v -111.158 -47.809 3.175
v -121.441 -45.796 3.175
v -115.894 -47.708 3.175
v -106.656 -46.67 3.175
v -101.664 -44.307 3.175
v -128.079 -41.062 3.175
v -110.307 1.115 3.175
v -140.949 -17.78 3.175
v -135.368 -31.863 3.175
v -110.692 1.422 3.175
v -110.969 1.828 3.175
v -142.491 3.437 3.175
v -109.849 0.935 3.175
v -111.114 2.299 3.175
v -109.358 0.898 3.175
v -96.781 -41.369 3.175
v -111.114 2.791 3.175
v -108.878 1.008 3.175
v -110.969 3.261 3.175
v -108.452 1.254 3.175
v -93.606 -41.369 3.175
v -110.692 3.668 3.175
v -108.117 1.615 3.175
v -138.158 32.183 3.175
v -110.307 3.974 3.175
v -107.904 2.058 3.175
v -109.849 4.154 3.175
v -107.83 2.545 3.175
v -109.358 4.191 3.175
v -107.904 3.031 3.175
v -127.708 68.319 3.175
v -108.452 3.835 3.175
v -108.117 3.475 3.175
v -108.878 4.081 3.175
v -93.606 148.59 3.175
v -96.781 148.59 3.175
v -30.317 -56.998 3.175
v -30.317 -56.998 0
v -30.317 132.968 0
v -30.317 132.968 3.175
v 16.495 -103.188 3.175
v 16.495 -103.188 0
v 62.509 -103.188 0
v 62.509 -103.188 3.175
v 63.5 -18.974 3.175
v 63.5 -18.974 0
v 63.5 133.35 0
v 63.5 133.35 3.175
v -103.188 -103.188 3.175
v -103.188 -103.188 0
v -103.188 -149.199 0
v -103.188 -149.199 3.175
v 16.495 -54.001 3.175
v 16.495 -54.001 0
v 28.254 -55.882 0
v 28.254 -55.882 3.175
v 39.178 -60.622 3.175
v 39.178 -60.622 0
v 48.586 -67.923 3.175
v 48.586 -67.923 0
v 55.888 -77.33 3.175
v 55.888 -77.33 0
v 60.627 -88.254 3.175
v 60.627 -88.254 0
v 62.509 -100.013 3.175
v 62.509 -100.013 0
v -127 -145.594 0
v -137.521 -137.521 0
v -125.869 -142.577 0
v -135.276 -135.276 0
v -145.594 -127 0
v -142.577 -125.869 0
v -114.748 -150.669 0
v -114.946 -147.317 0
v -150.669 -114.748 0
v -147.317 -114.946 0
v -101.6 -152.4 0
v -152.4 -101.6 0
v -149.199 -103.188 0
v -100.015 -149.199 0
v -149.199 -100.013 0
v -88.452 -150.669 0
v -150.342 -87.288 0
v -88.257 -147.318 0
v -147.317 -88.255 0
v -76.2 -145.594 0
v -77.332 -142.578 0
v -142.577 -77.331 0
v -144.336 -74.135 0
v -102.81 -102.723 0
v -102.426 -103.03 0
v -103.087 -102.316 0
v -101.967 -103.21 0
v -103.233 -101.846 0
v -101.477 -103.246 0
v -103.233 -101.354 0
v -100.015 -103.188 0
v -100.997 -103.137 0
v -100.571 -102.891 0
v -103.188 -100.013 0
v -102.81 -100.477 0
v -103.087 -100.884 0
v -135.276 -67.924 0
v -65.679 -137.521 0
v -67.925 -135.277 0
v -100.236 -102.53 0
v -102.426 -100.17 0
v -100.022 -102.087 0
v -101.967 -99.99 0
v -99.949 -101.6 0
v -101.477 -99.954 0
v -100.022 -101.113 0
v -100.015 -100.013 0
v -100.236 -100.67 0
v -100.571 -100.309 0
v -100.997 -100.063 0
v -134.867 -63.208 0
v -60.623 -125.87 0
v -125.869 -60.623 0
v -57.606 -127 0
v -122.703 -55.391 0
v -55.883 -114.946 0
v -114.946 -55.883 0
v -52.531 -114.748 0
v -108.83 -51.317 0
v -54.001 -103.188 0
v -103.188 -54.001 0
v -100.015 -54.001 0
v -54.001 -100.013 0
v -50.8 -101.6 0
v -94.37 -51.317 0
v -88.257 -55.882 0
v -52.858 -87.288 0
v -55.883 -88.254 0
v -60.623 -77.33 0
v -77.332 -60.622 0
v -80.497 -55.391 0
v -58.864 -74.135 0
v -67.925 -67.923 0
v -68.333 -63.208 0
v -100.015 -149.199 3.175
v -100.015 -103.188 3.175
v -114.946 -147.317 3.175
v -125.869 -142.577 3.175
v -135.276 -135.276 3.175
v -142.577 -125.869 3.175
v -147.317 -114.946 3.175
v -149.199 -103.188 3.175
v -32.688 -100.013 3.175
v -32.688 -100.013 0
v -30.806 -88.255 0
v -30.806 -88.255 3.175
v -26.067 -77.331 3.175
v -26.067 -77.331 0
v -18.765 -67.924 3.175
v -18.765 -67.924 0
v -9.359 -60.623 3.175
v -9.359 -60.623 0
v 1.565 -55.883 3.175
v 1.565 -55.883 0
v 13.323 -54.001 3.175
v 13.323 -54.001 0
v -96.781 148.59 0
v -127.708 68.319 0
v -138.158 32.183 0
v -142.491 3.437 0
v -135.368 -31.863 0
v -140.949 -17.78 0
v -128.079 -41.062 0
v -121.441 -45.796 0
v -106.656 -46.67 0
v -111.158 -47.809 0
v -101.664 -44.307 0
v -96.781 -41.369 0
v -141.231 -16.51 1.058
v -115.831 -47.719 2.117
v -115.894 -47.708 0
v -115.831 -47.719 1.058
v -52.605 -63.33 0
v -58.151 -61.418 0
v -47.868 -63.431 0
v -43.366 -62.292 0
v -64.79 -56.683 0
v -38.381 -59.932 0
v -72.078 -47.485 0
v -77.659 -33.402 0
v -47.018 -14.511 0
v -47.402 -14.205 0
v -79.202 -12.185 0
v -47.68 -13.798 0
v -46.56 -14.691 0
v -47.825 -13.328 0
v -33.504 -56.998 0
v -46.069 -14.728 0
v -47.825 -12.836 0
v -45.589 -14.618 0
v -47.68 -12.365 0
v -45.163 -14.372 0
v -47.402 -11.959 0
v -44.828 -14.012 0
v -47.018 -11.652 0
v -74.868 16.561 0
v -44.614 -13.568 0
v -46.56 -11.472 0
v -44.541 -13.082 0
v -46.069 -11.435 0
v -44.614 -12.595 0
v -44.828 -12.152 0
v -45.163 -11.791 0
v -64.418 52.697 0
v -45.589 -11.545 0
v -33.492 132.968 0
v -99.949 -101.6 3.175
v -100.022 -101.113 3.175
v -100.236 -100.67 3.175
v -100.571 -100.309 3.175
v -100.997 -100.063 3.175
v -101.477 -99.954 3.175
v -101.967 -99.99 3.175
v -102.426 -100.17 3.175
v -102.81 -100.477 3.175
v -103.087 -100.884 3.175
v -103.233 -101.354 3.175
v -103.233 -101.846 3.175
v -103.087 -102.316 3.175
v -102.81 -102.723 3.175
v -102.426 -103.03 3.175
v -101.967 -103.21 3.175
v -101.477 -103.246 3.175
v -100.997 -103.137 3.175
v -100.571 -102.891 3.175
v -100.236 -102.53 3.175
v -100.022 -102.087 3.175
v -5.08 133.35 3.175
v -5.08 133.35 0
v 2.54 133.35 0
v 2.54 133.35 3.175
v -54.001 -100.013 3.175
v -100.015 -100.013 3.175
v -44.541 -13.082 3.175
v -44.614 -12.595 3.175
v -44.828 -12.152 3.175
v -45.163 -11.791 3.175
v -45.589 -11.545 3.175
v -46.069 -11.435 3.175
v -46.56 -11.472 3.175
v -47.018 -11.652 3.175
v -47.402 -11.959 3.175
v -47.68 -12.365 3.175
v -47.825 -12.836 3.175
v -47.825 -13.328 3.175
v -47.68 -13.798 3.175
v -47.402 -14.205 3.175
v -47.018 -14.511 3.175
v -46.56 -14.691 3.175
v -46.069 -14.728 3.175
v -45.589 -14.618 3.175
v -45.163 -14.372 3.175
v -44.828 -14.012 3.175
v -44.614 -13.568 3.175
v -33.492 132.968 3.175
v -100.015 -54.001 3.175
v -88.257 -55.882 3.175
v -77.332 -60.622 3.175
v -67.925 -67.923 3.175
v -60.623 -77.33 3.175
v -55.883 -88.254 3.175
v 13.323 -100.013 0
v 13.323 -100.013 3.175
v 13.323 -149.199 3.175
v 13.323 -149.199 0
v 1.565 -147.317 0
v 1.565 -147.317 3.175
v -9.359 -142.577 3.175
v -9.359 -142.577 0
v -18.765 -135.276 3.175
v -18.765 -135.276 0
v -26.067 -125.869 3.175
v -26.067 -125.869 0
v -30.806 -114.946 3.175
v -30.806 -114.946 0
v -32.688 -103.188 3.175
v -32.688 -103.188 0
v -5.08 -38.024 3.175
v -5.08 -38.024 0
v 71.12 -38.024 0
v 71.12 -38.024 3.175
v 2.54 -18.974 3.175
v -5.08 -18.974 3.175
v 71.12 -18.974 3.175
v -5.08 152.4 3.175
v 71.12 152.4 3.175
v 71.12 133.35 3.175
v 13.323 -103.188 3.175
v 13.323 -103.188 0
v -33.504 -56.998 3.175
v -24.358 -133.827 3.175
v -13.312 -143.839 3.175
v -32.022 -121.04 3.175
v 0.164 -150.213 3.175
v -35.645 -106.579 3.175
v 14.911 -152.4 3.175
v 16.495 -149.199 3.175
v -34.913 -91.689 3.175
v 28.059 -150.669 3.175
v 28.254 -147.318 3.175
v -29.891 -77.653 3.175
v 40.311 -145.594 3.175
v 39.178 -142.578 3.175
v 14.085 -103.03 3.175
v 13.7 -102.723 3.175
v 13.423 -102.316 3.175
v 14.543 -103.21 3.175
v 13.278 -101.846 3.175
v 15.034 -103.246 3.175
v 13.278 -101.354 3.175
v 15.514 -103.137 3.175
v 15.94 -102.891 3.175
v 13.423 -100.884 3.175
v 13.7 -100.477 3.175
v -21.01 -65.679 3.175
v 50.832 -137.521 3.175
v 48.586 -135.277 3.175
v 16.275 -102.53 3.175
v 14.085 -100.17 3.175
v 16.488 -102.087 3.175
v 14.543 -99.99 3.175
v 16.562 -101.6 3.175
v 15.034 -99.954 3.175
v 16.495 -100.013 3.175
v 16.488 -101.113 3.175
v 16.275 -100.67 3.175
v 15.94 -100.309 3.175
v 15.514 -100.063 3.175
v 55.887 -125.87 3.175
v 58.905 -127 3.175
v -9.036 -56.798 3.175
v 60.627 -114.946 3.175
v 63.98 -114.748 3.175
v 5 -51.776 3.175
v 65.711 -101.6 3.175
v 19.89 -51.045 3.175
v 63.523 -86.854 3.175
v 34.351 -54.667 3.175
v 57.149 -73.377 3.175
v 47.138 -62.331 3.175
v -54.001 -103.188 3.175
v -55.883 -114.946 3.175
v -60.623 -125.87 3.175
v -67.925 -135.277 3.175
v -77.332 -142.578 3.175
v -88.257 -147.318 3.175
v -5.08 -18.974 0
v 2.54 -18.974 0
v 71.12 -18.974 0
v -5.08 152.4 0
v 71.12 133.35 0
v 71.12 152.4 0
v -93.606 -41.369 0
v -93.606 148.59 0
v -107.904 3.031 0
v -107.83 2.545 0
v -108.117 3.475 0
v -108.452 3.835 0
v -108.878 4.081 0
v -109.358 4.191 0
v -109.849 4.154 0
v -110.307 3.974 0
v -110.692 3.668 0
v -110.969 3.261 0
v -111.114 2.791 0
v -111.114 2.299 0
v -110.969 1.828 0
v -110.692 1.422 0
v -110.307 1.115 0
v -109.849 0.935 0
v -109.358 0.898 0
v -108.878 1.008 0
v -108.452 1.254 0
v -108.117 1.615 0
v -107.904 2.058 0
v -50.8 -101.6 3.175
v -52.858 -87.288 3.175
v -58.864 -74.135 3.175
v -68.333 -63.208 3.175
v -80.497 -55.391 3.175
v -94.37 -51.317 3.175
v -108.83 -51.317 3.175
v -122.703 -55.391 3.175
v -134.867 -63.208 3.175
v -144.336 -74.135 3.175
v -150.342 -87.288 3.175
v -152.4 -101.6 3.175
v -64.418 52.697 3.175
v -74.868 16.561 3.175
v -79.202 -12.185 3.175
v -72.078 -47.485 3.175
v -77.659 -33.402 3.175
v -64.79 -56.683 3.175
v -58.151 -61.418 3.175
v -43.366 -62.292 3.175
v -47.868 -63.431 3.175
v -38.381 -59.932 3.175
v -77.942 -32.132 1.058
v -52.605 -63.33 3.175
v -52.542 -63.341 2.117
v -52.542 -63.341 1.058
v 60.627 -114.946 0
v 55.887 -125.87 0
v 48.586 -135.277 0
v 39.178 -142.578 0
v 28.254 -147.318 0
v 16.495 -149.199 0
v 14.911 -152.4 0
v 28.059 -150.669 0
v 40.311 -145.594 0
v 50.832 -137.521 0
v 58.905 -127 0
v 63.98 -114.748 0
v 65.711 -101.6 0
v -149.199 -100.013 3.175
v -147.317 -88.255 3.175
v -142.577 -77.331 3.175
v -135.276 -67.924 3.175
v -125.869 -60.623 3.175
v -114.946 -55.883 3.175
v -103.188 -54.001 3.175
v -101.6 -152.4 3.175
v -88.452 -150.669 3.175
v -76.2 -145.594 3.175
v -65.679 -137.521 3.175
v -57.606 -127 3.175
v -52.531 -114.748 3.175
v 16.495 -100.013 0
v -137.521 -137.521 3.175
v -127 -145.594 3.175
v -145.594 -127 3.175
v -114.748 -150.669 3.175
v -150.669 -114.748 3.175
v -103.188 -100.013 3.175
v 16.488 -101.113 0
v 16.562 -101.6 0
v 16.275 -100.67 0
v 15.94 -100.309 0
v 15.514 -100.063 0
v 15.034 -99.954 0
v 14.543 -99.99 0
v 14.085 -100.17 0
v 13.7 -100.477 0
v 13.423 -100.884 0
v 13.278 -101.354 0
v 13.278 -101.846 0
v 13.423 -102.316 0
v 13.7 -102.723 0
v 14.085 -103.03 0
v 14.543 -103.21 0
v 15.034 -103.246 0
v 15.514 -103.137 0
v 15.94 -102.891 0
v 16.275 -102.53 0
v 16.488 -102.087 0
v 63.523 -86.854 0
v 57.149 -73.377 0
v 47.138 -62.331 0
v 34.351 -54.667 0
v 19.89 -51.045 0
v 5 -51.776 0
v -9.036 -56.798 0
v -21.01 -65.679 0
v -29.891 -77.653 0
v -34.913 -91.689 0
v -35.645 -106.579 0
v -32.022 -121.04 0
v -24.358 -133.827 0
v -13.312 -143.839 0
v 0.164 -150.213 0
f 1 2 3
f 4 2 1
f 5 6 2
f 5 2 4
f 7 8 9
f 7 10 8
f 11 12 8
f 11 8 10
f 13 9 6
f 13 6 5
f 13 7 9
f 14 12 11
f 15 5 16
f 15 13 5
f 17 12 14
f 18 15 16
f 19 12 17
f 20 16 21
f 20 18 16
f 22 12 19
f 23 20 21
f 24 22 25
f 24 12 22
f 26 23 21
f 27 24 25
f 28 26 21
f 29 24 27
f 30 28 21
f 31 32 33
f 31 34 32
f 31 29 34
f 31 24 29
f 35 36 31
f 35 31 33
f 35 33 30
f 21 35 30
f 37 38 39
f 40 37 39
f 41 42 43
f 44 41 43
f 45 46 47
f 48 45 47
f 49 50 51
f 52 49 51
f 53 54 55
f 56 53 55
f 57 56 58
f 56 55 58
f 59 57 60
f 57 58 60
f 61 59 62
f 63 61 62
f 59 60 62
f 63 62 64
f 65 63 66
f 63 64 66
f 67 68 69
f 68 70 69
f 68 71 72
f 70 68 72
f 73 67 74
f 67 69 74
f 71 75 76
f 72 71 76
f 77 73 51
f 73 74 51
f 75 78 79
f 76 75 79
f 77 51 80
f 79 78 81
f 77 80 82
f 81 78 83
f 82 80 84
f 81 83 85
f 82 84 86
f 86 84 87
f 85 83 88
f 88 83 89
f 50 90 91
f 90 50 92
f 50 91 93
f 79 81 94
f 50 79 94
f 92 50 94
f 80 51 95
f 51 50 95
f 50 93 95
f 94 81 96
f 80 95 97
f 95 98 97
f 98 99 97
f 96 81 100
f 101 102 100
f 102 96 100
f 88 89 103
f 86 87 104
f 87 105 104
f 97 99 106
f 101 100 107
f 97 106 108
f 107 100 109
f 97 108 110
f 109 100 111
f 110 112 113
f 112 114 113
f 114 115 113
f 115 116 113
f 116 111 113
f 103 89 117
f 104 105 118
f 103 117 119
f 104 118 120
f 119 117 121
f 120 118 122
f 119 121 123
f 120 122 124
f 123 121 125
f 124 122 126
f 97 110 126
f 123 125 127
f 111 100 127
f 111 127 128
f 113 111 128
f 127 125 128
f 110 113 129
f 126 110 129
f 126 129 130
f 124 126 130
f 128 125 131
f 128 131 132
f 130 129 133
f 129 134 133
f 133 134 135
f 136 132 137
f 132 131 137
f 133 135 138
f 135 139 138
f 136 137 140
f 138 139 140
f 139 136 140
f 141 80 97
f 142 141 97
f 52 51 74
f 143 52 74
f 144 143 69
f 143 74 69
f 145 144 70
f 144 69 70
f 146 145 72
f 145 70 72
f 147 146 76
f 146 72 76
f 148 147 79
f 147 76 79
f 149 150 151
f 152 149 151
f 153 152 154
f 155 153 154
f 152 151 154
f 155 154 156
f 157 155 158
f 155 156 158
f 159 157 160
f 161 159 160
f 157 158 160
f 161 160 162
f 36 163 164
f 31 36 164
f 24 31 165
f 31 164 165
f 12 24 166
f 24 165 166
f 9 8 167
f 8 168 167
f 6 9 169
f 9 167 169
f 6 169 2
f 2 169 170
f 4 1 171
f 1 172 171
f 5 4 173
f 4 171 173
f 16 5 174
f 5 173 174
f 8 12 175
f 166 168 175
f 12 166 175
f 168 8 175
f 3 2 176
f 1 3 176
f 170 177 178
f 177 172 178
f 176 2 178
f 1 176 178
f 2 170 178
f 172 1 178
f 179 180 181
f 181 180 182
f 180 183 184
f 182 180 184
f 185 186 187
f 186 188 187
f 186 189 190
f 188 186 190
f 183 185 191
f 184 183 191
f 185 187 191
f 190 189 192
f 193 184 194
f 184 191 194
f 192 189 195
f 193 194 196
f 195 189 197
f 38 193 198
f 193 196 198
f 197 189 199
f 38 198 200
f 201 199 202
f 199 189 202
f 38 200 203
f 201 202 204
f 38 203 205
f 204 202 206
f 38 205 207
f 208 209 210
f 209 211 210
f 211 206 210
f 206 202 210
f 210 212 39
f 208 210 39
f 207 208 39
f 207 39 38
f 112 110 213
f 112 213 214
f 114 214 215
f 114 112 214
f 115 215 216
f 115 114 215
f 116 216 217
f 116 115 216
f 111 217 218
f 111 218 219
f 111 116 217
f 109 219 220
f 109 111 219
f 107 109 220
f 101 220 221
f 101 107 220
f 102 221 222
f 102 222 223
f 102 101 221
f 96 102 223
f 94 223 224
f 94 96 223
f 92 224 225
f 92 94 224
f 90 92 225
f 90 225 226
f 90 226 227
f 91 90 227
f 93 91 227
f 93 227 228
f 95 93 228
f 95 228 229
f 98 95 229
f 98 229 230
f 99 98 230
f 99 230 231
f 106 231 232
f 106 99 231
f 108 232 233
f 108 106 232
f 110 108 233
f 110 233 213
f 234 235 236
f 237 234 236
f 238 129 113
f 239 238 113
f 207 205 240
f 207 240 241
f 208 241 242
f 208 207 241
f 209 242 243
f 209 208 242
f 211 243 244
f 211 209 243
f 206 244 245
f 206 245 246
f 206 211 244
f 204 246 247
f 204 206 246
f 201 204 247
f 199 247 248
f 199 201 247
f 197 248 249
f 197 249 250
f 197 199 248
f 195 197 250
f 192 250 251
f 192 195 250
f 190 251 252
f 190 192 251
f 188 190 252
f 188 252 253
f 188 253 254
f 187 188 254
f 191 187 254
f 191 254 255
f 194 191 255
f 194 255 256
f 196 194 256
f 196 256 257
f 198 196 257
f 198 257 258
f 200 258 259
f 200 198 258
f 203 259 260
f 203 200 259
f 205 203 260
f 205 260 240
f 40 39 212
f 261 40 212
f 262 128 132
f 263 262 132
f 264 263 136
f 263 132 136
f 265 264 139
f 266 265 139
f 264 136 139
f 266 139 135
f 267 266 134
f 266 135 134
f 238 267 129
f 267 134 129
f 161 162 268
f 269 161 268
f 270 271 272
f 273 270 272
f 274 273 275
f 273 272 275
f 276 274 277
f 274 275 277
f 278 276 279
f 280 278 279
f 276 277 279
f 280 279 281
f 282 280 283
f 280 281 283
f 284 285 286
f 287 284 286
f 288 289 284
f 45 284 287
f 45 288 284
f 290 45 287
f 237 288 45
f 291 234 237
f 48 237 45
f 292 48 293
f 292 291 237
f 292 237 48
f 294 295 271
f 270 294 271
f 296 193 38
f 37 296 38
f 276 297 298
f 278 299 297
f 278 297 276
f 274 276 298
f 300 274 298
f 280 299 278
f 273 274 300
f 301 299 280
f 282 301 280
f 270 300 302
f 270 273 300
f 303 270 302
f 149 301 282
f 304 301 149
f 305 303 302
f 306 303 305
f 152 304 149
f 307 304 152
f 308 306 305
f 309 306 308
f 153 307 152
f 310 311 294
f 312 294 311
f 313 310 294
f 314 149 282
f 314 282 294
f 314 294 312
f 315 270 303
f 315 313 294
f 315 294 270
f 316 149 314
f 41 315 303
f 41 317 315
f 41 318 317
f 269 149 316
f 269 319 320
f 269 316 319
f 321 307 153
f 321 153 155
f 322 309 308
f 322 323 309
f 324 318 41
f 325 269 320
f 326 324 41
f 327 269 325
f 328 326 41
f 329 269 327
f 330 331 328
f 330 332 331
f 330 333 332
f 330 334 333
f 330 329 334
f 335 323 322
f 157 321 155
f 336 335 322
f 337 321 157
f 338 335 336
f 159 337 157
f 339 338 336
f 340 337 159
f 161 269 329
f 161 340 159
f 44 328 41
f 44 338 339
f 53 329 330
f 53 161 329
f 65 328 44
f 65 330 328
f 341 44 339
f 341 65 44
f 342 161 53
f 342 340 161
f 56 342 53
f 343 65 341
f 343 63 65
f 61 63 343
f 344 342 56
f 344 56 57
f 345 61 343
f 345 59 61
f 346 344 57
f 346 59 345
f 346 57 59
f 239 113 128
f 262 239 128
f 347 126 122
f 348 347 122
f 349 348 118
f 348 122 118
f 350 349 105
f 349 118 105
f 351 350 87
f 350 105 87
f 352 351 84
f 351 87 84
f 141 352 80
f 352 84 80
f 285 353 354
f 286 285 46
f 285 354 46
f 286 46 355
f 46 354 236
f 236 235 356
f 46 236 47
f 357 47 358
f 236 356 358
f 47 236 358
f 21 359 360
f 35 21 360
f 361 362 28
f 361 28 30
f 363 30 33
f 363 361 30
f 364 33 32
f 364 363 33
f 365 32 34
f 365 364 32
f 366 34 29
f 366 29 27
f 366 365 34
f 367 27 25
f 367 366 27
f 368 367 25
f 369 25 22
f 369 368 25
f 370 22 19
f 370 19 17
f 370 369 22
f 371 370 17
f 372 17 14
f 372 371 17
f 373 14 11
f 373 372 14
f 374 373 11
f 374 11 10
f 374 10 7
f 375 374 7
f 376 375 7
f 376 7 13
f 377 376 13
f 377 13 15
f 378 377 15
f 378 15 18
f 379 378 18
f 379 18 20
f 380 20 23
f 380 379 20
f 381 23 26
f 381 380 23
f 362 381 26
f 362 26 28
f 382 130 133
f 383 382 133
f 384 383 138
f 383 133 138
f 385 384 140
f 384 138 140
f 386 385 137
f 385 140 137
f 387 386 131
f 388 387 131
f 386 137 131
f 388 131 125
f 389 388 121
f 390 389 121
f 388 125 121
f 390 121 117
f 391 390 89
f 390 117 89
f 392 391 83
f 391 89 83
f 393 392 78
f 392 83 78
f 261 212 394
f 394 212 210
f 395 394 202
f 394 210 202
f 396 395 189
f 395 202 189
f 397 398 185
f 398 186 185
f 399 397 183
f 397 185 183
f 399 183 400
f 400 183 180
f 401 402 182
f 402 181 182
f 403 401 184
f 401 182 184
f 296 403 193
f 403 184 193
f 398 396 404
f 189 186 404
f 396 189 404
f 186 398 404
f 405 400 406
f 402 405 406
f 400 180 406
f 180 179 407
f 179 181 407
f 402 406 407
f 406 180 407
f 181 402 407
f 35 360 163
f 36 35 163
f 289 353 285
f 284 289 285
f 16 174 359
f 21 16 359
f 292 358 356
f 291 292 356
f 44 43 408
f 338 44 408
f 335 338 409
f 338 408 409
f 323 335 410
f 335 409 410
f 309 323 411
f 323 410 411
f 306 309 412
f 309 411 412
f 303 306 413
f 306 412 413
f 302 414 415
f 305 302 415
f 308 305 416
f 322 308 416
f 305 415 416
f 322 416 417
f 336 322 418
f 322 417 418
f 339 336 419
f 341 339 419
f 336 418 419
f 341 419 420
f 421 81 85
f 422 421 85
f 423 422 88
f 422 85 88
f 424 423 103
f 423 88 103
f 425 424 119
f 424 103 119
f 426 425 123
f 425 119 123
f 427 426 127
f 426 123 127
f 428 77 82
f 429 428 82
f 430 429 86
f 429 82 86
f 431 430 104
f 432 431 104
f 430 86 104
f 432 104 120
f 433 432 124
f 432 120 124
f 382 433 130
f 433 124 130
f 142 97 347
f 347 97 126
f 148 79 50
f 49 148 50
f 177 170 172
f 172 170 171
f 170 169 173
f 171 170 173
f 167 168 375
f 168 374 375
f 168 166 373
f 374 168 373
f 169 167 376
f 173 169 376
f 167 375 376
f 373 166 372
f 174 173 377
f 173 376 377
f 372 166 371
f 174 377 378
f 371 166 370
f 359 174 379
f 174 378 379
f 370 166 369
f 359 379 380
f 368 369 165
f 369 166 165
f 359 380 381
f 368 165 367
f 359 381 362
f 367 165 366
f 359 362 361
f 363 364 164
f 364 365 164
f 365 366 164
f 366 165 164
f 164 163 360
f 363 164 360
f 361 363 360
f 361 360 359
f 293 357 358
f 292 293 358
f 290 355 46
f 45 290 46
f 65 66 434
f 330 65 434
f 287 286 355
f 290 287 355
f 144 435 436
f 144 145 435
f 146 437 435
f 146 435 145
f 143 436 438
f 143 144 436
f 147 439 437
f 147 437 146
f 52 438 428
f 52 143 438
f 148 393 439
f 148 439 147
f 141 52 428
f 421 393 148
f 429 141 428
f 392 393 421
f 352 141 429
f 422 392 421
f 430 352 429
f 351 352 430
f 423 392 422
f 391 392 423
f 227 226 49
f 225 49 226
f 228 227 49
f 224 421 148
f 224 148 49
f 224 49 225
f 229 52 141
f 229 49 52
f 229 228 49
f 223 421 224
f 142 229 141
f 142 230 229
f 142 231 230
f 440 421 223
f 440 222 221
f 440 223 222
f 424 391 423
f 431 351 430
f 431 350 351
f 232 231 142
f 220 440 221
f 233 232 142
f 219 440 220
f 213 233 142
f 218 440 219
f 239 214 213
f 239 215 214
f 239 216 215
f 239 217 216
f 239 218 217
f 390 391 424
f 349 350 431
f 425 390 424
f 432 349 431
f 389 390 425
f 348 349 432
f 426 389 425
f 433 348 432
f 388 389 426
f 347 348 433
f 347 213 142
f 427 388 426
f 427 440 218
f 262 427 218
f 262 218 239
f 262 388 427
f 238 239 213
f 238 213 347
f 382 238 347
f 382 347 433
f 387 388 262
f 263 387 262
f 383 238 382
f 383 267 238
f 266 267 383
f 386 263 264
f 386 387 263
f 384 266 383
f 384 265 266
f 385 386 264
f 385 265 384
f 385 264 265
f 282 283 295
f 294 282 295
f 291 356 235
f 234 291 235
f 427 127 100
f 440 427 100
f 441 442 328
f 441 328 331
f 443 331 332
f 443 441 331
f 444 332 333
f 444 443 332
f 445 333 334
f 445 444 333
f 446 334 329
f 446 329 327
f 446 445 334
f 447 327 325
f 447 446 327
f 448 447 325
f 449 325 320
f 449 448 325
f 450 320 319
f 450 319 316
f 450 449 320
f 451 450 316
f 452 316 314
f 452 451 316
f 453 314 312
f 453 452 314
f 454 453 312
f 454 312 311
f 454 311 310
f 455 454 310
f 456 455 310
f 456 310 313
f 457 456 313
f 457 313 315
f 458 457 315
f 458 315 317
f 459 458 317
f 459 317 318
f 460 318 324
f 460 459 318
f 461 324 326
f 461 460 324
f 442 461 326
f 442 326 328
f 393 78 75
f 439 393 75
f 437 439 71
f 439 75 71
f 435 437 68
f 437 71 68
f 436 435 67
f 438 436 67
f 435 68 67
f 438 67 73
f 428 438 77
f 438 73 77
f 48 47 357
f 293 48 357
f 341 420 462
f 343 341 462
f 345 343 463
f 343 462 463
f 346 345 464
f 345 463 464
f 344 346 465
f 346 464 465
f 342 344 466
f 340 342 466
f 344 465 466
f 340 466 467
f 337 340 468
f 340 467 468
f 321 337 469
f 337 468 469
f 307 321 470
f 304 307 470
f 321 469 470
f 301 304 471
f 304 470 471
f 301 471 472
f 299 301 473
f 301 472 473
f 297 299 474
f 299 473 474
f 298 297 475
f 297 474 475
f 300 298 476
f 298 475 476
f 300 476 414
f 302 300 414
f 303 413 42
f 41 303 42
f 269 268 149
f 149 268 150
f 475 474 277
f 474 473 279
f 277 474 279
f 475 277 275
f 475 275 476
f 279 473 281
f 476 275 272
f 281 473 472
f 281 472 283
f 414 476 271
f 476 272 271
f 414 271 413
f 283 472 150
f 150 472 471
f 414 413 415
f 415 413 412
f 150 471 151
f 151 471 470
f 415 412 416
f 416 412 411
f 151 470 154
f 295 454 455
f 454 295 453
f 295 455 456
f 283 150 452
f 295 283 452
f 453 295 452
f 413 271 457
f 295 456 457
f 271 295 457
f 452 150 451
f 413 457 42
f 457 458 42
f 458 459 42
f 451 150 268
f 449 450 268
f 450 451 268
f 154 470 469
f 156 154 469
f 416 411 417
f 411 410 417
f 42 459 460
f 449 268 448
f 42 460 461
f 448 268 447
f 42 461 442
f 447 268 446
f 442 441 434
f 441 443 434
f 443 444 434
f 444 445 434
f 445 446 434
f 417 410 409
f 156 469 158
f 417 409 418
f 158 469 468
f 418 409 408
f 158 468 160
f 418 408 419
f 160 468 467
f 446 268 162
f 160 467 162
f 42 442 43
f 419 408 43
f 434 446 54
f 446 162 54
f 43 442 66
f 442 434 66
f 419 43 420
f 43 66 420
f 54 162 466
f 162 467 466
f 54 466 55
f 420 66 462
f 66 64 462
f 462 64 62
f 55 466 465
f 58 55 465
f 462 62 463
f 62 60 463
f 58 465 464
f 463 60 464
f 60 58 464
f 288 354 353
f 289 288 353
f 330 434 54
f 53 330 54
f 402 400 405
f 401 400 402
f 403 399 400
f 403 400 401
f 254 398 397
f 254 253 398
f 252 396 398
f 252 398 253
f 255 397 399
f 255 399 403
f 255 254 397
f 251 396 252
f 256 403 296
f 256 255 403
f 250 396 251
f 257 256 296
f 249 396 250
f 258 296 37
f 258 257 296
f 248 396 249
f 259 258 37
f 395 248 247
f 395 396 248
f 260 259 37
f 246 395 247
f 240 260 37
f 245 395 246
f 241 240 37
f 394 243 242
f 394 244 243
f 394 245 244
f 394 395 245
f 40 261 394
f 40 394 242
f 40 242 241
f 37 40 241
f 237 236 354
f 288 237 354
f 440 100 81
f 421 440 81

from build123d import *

# Parameters (mm, degrees)
F0_R     = 1.651
F1_DEPTH = 3.175


# Not quite as in the source:
# - a feature names something its author has since deleted; it is built from what else it names


with BuildPart() as f1:
    # F0 (on Top) → F1 (new body)
    with BuildSketch(Plane.XY):
        with BuildLine():
            ThreePointArc((65.7106608197, -101.6), (-21.0103637537, -65.6789756049), (14.9106610719, -152.4))
            ThreePointArc((14.9106610719, -152.4), (50.8316853932, -137.5210243951), (65.7106608197, -101.6))
        make_face()
        with BuildLine():
            Line((-32.6878734933, -103.1875), (13.3231608197, -103.1875))
            Line((13.3231608197, -103.1875), (13.3231608197, -149.198534313))
            ThreePointArc((13.3231608197, -149.198534313), (-18.7652996343, -135.275960454), (-32.6878734933, -103.1875))
        make_face(mode=Mode.SUBTRACT)
        with BuildLine():
            Line((13.3231608197, -54.001465687), (13.3231608197, -100.0126722037))
            Line((13.3231608197, -100.0126722037), (-32.6878792363, -100.0126722037))
            ThreePointArc((-32.6878792363, -100.0126722037), (-18.7653605513, -67.9241004631), (13.3231608197, -54.001465687))
        make_face(mode=Mode.SUBTRACT)
        with BuildLine():
            ThreePointArc((62.5091951328, -103.1875), (48.5855888423, -135.2769928537), (16.4952423273, -149.1986315606))
            Line((16.4952423273, -149.1986315606), (16.4952423273, -103.1875))
            Line((16.4952423273, -103.1875), (62.5091951328, -103.1875))
        make_face(mode=Mode.SUBTRACT)
        with Locations((14.9106608197, -101.6)):
            Circle(F0_R, mode=Mode.SUBTRACT)
        with BuildLine():
            Line((16.4952423273, -100.0126722037), (16.4952423273, -54.0013684394))
            ThreePointArc((16.4952423273, -54.0013684394), (48.5856497612, -67.9230680615), (62.5092008758, -100.0126722037))
            Line((62.5092008758, -100.0126722037), (16.4952423273, -100.0126722037))
        make_face(mode=Mode.SUBTRACT)
    extrude(amount=F1_DEPTH)


with BuildPart() as f1b:
    # F0 (on Top) → F1, piece 2 (new body)
    with BuildSketch(Plane.XY):
        with BuildLine():
            ThreePointArc((-152.4, -101.6), (-137.5210244843, -137.5210244843), (-101.6, -152.4))
            ThreePointArc((-101.6, -152.4), (-65.6789755157, -137.5210244843), (-50.8, -101.6))
            ThreePointArc((-50.8, -101.6), (-101.6, -50.8), (-152.4, -101.6))
        make_face()
        with BuildLine():
            Line((-149.198534313, -103.1875), (-103.1875, -103.1875))
            Line((-103.1875, -103.1875), (-103.1875, -149.198534313))
            ThreePointArc((-103.1875, -149.198534313), (-135.275960454, -135.275960454), (-149.198534313, -103.1875))
        make_face(mode=Mode.SUBTRACT)
        with BuildLine():
            Line((-103.1875, -54.001465687), (-103.1875, -100.0126722037))
            Line((-103.1875, -100.0126722037), (-149.198540056, -100.0126722037))
            ThreePointArc((-149.198540056, -100.0126722037), (-135.276021371, -67.9241004631), (-103.1875, -54.001465687))
        make_face(mode=Mode.SUBTRACT)
        with Locations((-101.6, -101.6)):
            Circle(F0_R, mode=Mode.SUBTRACT)
        with BuildLine():
            ThreePointArc((-54.001465687, -103.1875), (-67.9250719774, -135.2769928537), (-100.0154184924, -149.1986315606))
            Line((-100.0154184924, -149.1986315606), (-100.0154184924, -103.1875))
            Line((-100.0154184924, -103.1875), (-54.001465687, -103.1875))
        make_face(mode=Mode.SUBTRACT)
        with BuildLine():
            Line((-100.0154184924, -100.0126722037), (-100.0154184924, -54.0013684394))
            ThreePointArc((-100.0154184924, -54.0013684394), (-67.9250110585, -67.9230680615), (-54.001459944, -100.0126722037))
            Line((-54.001459944, -100.0126722037), (-100.0154184924, -100.0126722037))
        make_face(mode=Mode.SUBTRACT)
    extrude(amount=F1_DEPTH)


with BuildPart() as f1c:
    # F0 (on Top) → F1, piece 3 (new body)
    with BuildSketch(Plane.XY):
        Polygon((71.12, 133.35), (71.12, 152.4), (-5.08, 152.4), (-5.08, 133.35), (2.54, 133.35), (2.54, -18.9738), (-5.08, -18.9738), (-5.08, -38.0238), (71.12, -38.0238), (71.12, -18.9738), (63.5, -18.9738), (63.5, 133.35), align=None)
    extrude(amount=F1_DEPTH)


with BuildPart() as f1d:
    # F0 (on Top) → F1, piece 4 (new body)
    with BuildSketch(Plane.XY):
        with BuildLine():
            Line((-93.6064264297, 148.5900000185), (-96.7814264297, 148.5900000185))
            add(Edge.make_bspline(
                [(-96.7814264297, 148.5900000185), (-122.8968017051, 84.5413605912), (-161.6813226062, -10.5786891249), (-117.4032009161, -54.2310342357), (-102.8189814093, -45.1346689408), (-96.7814264297, -41.3689682424)],
                knots=[0, 0, 0, 0, 0.5470988668, 0.8125086166, 1, 1, 1, 1], degree=3))
            Line((-96.7814264297, -41.3689682424), (-93.6064264297, -41.3689682424))
            Line((-93.6064264297, -41.3689682424), (-93.6064264297, 148.5900000185))
        make_face()
        with Locations((-109.4814264297, 2.5445778297)):
            Circle(F0_R, mode=Mode.SUBTRACT)
    extrude(amount=F1_DEPTH)


with BuildPart() as f1e:
    # F0 (on Top) → F1, piece 5 (new body)
    with BuildSketch(Plane.XY):
        with BuildLine():
            Line((-30.3171201937, 132.9683979097), (-33.4921201937, 132.9683979097))
            add(Edge.make_bspline(
                [(-33.4921201937, 132.9683979097), (-59.6074954691, 68.9197584825), (-98.3920163702, -26.2002912337), (-54.1195029261, -69.8471073591), (-39.5378329238, -60.761356619), (-33.504356178, -56.9982020903)],
                knots=[0, 0, 0, 0, 0.5470988668, 0.8125086166, 0.9998733405, 0.9998733405, 0.9998733405, 0.9998733405], degree=3))
            Line((-33.504356178, -56.9982020903), (-30.3171201937, -56.9982020903))
            Line((-30.3171201937, -56.9982020903), (-30.3171201937, 132.9683979097))
        make_face()
        with Locations((-46.1921201937, -13.0816020903)):
            Circle(F0_R, mode=Mode.SUBTRACT)
    extrude(amount=F1_DEPTH)


solid = Compound([f1.part, f1b.part, f1c.part, f1d.part, f1e.part])
